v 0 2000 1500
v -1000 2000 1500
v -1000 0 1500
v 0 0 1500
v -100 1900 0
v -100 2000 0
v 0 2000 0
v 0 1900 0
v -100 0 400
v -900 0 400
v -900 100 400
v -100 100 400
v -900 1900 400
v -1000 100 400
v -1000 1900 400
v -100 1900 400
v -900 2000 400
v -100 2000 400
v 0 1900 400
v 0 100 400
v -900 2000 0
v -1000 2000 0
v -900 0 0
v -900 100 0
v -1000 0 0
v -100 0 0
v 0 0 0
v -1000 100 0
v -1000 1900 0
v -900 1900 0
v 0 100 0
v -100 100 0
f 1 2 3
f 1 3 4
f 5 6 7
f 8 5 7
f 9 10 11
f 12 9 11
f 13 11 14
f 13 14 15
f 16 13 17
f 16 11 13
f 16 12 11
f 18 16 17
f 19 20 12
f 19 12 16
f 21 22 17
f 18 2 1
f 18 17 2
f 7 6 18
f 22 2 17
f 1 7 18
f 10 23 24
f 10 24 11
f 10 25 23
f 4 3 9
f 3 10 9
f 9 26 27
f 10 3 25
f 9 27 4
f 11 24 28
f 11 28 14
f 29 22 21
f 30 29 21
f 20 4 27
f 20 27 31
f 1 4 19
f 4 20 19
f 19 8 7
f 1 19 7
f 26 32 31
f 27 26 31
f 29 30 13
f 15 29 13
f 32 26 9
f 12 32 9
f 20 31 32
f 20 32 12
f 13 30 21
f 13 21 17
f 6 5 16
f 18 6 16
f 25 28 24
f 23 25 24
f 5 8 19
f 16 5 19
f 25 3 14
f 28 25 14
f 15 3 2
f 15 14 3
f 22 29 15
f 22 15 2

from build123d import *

# Parameters (mm, degrees)
F0_W     = 1000
F0_H     = 2000
F1_DEPTH = 1500
F2_W     = 800
F2_H     = 400
F3_DEPTH = 2000
F4_W     = 1800
F4_H     = 400
F5_DEPTH = 1000


with BuildPart() as f1:
    # F0 (on Top) → F1 (new body)
    with BuildSketch(Plane.XY):
        with Locations((-500, 1000)):
            Rectangle(F0_W, F0_H)
    extrude(amount=F1_DEPTH)

    # F2 (on face) → F3 (cut)
    with BuildSketch(Plane.XZ):
        with Locations((-500, 200)):
            Rectangle(F2_W, F2_H)
    extrude(amount=-F3_DEPTH, mode=Mode.SUBTRACT)

    # F4 (on face) → F5 (cut)
    with BuildSketch(Plane.YZ):
        with Locations((1000, 200)):
            Rectangle(F4_W, F4_H)
    extrude(amount=-F5_DEPTH, mode=Mode.SUBTRACT)


solid = f1.part
